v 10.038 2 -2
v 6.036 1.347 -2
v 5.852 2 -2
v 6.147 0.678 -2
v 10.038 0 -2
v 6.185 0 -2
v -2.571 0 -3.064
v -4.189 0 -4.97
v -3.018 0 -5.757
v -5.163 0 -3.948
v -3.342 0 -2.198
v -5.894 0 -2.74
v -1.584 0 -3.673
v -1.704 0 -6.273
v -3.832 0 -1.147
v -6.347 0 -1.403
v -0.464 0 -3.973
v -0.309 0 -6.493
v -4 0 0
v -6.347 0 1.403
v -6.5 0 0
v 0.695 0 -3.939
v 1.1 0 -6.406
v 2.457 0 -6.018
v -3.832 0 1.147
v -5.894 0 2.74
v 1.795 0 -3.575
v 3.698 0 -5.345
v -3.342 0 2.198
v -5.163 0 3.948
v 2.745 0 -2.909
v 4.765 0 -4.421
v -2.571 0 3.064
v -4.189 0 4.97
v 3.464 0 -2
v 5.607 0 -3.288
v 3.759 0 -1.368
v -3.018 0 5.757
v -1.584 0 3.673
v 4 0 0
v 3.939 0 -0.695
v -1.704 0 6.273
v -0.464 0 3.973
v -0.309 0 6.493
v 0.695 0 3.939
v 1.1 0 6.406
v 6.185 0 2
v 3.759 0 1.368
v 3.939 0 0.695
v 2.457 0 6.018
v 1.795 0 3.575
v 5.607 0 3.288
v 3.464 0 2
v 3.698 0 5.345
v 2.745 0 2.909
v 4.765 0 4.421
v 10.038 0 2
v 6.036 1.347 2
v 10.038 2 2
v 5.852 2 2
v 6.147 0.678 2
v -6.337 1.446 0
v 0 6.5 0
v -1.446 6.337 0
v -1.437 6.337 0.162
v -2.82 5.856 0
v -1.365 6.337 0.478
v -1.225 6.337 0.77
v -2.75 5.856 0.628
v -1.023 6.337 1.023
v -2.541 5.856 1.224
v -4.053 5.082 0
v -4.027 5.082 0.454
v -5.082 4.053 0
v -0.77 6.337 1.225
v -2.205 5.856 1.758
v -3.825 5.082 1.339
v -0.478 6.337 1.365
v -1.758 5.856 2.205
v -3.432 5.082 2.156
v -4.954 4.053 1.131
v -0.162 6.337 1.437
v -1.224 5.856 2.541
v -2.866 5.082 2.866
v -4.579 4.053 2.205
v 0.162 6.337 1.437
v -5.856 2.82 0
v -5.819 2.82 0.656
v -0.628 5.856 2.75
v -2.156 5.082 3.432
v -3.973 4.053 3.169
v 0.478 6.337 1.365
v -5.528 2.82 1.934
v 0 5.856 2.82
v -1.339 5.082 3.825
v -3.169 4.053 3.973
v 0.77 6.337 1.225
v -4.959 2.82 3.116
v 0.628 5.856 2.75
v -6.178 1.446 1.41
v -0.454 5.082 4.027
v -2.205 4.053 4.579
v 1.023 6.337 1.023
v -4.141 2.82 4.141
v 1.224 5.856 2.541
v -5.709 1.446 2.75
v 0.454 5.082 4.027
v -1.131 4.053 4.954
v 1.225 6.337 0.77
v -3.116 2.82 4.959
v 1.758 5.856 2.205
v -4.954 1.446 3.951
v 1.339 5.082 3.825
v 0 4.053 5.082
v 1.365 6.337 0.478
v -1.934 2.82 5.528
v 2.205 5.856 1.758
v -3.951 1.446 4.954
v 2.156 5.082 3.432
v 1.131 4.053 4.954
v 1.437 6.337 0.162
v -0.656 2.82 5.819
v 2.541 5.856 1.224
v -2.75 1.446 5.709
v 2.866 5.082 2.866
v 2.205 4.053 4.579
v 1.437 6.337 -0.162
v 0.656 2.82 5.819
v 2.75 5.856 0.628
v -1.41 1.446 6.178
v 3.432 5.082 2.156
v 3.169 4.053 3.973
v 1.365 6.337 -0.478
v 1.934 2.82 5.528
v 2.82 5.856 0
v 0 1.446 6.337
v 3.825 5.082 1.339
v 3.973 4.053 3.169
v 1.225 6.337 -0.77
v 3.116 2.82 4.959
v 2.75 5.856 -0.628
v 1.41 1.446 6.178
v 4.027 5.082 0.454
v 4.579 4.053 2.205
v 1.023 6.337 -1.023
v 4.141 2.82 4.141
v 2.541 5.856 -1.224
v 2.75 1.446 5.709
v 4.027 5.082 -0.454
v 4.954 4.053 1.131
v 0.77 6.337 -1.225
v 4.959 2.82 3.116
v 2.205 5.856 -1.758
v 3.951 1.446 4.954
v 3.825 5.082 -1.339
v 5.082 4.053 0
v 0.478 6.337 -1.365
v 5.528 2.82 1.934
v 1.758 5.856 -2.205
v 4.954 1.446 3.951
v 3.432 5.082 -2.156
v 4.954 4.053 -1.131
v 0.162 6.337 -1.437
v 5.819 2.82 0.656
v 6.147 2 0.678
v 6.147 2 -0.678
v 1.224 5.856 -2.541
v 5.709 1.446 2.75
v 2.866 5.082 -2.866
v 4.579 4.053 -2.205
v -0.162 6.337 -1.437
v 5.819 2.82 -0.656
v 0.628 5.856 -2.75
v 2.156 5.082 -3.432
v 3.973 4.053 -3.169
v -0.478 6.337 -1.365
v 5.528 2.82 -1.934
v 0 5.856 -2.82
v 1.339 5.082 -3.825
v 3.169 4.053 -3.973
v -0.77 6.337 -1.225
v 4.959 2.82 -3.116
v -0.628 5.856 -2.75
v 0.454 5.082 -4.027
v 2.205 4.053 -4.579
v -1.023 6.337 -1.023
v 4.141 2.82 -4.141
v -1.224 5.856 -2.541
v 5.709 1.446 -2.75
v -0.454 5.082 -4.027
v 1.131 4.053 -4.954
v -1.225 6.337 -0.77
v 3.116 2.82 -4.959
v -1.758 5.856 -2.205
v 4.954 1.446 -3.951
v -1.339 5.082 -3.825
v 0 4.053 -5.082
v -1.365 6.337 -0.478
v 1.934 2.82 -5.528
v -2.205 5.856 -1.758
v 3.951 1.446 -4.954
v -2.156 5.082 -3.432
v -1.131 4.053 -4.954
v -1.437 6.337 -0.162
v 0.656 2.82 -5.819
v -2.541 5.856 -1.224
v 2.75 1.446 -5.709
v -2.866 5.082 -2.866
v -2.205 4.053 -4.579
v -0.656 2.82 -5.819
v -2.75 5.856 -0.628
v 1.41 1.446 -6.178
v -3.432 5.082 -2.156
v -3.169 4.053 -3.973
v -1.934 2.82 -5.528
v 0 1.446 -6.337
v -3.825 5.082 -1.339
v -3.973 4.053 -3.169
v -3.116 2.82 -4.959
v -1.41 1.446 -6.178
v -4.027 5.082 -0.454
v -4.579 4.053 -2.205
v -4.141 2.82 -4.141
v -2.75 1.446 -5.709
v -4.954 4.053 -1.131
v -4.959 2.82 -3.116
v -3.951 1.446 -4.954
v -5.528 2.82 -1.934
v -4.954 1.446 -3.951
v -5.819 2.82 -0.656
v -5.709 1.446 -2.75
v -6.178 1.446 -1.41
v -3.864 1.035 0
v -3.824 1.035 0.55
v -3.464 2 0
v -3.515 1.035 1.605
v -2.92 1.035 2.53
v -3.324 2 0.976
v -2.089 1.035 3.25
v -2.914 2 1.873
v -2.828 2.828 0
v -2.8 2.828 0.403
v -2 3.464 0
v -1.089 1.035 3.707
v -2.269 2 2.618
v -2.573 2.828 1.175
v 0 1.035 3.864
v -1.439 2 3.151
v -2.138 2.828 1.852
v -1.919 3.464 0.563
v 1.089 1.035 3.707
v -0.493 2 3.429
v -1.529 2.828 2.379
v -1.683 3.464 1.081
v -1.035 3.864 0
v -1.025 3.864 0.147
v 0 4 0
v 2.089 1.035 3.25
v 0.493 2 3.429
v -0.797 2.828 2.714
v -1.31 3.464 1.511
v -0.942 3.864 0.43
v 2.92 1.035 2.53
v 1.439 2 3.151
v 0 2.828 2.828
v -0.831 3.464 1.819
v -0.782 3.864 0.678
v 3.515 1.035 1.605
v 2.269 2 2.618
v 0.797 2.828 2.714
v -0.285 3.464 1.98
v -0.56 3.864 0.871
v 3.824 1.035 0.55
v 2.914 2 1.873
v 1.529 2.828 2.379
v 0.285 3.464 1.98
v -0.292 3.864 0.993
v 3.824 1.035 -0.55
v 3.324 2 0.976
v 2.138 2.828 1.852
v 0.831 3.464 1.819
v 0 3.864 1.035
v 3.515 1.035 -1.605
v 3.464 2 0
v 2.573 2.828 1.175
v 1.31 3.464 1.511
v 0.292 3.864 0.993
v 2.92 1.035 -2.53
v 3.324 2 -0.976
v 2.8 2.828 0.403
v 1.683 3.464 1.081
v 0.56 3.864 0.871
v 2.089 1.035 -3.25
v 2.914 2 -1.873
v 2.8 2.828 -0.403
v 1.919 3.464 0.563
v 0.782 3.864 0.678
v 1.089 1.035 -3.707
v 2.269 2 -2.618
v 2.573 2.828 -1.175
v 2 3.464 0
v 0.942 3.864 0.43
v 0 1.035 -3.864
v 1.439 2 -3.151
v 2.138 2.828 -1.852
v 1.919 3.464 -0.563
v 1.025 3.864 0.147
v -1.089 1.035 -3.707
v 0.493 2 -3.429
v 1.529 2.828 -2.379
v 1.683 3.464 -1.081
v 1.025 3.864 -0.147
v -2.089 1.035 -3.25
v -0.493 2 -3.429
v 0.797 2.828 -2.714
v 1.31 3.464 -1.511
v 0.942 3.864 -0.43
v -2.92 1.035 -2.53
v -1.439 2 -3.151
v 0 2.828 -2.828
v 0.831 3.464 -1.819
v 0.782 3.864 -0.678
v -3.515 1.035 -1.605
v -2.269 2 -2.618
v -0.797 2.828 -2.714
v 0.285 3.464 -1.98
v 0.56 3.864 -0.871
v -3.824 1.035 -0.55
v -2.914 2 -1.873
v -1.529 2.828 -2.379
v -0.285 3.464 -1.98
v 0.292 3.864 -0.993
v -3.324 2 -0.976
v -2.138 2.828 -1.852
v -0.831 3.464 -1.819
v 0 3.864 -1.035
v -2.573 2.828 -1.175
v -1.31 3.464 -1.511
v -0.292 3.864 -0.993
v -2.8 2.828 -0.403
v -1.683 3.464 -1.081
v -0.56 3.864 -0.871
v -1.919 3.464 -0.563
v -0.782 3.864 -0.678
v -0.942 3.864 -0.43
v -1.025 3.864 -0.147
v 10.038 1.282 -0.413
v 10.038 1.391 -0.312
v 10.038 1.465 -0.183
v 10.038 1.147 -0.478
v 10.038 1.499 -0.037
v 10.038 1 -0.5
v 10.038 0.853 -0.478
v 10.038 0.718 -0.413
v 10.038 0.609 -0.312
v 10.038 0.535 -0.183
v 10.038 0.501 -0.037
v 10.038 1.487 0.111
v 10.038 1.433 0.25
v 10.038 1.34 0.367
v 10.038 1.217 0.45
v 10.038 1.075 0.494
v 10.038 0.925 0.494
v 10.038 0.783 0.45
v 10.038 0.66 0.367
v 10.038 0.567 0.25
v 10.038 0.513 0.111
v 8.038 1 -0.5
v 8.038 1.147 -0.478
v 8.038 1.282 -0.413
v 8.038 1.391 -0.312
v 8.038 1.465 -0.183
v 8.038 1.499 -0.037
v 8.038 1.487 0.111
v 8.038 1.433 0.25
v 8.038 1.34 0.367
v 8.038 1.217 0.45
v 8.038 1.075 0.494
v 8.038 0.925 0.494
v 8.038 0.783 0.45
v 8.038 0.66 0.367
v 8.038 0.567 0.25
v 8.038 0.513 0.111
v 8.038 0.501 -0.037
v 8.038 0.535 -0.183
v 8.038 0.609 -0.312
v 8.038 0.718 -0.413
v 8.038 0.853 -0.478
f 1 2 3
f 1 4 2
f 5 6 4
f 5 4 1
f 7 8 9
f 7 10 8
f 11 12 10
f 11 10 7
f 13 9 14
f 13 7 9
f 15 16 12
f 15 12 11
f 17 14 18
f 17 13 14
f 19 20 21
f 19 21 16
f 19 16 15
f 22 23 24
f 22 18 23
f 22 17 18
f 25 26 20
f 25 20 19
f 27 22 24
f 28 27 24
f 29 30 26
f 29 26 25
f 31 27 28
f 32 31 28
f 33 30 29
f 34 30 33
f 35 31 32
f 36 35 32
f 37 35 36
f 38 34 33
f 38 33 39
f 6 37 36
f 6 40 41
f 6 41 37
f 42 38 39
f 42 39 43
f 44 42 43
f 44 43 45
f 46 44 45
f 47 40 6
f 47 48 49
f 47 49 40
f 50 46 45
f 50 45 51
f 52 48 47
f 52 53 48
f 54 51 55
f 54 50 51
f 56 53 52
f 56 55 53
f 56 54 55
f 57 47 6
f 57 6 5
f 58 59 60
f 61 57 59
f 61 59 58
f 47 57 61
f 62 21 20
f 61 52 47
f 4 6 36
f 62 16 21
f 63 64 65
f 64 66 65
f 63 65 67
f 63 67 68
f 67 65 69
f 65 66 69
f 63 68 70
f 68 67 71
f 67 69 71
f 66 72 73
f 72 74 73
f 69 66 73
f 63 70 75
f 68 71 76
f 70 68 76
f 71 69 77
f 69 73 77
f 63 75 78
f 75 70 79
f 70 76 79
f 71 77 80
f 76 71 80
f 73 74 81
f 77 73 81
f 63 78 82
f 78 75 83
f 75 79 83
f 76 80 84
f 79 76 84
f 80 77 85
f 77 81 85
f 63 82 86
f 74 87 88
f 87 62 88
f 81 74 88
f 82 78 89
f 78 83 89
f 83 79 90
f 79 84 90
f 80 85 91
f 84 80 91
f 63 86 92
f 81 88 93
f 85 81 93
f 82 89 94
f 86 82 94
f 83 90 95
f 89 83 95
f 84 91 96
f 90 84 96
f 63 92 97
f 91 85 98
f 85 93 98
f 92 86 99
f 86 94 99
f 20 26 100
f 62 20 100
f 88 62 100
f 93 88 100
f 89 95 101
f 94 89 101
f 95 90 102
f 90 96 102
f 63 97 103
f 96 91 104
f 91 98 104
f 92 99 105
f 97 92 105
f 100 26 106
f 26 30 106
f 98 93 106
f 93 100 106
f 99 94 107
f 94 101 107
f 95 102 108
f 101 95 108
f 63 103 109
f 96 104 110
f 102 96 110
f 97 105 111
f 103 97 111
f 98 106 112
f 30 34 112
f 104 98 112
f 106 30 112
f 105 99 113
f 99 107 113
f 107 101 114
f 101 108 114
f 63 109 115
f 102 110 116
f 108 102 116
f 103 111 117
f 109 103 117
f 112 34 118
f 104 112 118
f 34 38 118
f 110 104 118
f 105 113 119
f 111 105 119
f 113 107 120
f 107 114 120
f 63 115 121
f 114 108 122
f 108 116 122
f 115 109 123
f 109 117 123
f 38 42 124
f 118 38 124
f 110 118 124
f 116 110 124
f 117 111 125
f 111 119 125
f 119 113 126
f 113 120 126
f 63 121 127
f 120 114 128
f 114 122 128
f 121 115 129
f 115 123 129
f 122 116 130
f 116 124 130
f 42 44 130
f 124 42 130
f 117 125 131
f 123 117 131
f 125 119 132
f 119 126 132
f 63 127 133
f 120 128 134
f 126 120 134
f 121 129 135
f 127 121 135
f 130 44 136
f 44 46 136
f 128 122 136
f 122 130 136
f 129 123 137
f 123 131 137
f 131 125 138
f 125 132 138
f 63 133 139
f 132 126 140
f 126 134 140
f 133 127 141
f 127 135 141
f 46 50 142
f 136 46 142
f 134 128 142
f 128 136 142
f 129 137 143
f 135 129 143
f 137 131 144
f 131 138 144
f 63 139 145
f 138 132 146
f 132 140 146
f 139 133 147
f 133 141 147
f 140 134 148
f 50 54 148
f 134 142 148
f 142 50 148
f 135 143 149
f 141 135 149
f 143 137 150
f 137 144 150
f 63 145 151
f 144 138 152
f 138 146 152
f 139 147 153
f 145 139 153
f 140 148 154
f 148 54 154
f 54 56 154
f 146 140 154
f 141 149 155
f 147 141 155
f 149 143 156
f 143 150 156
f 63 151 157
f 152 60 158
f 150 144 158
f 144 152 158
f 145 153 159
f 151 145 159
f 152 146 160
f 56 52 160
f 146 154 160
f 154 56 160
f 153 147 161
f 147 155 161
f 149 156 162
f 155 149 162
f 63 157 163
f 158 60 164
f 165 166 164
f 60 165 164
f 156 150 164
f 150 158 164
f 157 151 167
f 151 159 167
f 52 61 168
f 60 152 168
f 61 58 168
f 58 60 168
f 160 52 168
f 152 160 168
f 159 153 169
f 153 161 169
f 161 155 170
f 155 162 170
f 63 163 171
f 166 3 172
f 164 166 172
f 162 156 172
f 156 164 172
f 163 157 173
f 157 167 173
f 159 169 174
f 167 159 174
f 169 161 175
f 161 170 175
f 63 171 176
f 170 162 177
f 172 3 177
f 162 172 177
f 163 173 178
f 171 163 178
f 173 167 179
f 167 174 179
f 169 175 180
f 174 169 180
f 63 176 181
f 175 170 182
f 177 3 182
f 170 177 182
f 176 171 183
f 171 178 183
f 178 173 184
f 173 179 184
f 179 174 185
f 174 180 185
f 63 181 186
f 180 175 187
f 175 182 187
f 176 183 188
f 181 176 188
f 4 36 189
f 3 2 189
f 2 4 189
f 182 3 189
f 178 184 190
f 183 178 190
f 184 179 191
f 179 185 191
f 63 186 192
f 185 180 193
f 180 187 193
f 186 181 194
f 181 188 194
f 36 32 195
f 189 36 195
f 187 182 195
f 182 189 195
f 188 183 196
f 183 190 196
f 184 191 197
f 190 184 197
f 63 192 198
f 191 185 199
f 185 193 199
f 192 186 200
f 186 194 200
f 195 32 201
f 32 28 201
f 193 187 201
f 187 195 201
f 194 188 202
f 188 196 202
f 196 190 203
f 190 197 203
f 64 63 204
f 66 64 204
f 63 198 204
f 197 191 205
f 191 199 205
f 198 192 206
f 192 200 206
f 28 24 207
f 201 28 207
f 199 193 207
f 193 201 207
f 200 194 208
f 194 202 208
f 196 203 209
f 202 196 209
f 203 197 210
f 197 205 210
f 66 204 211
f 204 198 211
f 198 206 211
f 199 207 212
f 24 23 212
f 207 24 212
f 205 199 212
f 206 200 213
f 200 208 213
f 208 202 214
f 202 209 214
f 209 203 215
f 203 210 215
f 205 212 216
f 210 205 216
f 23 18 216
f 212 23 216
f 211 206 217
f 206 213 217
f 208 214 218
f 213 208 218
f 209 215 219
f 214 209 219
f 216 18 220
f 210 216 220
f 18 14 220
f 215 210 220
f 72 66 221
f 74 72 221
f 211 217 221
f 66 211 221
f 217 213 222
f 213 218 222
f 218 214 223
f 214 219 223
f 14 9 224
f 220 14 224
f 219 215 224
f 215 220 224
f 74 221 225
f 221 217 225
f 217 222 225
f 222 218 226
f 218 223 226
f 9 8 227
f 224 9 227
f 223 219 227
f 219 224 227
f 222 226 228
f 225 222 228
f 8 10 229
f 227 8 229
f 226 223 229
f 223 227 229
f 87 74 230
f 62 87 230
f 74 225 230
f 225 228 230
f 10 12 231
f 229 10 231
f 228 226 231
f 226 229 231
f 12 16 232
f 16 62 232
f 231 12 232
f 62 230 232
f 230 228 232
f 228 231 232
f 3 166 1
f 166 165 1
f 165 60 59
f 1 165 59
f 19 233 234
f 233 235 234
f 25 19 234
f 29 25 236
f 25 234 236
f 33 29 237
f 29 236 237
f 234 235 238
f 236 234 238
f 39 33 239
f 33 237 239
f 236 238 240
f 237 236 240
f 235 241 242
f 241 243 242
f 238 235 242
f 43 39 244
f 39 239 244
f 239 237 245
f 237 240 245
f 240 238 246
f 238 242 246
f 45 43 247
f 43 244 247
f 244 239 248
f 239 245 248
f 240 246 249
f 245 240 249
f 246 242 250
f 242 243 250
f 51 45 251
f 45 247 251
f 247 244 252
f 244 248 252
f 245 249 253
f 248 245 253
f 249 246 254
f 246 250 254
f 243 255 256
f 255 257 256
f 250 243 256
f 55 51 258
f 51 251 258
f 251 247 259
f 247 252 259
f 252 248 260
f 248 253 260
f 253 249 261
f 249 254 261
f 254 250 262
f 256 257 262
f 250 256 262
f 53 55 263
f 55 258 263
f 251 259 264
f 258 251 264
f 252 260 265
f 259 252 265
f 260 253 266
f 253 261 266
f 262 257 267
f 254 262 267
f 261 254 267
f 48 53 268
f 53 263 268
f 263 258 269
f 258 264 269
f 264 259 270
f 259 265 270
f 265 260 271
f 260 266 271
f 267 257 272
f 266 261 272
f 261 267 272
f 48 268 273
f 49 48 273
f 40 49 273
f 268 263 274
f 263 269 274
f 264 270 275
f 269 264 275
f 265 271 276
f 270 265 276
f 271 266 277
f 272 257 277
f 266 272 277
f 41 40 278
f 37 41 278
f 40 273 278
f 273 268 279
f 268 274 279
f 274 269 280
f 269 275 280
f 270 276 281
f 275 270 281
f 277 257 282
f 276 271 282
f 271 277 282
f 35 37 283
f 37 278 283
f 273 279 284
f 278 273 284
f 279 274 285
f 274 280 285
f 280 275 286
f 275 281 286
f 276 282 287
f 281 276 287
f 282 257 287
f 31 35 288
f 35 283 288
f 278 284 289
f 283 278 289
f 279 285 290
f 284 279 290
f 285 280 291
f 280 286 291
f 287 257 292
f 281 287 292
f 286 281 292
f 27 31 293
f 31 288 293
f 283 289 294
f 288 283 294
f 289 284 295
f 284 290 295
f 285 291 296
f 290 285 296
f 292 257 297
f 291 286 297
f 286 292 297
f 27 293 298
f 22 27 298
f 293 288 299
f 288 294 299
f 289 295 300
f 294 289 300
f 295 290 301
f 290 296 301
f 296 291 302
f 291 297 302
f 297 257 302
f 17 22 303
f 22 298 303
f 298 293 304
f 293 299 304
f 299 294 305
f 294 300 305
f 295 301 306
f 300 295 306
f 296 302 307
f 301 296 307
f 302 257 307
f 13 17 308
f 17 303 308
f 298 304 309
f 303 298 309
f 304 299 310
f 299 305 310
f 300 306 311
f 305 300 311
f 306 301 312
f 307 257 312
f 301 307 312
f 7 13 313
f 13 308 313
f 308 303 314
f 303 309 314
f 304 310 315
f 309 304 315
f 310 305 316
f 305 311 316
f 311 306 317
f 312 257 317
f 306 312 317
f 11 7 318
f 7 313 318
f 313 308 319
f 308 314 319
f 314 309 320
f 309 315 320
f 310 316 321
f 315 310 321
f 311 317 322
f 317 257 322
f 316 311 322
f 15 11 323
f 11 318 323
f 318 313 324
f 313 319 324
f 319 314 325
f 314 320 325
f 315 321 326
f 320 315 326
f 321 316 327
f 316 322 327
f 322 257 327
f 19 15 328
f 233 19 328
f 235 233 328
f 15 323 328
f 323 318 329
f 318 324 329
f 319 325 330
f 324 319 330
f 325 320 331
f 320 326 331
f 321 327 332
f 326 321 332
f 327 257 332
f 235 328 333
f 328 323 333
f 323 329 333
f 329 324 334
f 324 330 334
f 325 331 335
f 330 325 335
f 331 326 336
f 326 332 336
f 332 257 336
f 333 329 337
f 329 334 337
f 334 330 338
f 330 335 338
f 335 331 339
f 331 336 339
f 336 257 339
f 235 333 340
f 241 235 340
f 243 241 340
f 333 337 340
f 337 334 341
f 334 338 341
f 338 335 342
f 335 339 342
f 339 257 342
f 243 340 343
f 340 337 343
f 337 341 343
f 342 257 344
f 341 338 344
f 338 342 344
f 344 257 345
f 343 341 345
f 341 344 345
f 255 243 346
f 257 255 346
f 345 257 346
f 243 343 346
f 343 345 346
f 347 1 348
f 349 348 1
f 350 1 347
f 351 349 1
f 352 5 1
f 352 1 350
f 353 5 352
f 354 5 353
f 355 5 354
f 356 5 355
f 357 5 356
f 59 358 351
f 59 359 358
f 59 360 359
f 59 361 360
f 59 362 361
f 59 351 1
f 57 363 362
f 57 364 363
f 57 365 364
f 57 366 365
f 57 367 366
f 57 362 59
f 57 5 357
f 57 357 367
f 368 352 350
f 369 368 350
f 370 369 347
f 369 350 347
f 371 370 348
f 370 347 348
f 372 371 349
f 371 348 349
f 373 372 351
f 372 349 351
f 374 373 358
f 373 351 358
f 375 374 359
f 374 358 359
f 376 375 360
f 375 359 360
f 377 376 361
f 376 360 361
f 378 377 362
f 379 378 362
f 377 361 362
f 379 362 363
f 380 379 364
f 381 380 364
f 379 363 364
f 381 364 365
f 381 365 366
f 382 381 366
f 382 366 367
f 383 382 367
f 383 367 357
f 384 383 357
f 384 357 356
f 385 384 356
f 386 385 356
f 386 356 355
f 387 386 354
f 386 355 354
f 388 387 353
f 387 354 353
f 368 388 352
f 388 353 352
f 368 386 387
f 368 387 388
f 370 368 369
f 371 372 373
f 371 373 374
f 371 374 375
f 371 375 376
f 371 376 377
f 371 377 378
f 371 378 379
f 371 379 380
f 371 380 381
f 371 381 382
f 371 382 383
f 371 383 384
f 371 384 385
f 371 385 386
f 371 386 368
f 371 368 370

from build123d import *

# Parameters (mm, degrees)
BOSS_EXTRUDE1_DEPTH = 2
SKETCH3_R           = 0.5
CUT_EXTRUDE1_DEPTH  = 2


with BuildPart() as part:
    # Sketch1 → Revolve1 (revolve)
    with BuildSketch(Plane.XY):
        with BuildLine():
            ThreePointArc((-4, 0), (-2.828427125, 2.828427125), (0, 4))
            Line((0, 4), (0, 4.973305283))
            Line((0, 4.973305283), (0, 6.5))
            ThreePointArc((0, 6.5), (-4.596194078, 4.596194078), (-6.5, 0))
            Line((-6.5, 0), (-4, 0))
        make_face()
    revolve(axis=Axis((0, 0, 0), (0, 1, 0)))

    # Sketch2 → Boss-Extrude1 (add)
    with BuildSketch(Plane.XZ):
        with BuildLine():
            Line((10.037634205, 2), (3.464101615, 2))
            ThreePointArc((3.464101615, 2), (4, 0), (3.464101615, -2))
            Line((3.464101615, -2), (10.037634205, -2))
            Line((10.037634205, -2), (10.037634205, 2))
        make_face()
    extrude(amount=-BOSS_EXTRUDE1_DEPTH)

    # Sketch3 → Cut-Extrude1 (cut)
    with BuildSketch(Plane(origin=(10.037634205, 0, 0), x_dir=(0, 0, -1), z_dir=(1, 0, 0))):
        with Locations((0, 1)):
            Circle(SKETCH3_R)
    extrude(amount=-CUT_EXTRUDE1_DEPTH, mode=Mode.SUBTRACT)


solid = part.part
